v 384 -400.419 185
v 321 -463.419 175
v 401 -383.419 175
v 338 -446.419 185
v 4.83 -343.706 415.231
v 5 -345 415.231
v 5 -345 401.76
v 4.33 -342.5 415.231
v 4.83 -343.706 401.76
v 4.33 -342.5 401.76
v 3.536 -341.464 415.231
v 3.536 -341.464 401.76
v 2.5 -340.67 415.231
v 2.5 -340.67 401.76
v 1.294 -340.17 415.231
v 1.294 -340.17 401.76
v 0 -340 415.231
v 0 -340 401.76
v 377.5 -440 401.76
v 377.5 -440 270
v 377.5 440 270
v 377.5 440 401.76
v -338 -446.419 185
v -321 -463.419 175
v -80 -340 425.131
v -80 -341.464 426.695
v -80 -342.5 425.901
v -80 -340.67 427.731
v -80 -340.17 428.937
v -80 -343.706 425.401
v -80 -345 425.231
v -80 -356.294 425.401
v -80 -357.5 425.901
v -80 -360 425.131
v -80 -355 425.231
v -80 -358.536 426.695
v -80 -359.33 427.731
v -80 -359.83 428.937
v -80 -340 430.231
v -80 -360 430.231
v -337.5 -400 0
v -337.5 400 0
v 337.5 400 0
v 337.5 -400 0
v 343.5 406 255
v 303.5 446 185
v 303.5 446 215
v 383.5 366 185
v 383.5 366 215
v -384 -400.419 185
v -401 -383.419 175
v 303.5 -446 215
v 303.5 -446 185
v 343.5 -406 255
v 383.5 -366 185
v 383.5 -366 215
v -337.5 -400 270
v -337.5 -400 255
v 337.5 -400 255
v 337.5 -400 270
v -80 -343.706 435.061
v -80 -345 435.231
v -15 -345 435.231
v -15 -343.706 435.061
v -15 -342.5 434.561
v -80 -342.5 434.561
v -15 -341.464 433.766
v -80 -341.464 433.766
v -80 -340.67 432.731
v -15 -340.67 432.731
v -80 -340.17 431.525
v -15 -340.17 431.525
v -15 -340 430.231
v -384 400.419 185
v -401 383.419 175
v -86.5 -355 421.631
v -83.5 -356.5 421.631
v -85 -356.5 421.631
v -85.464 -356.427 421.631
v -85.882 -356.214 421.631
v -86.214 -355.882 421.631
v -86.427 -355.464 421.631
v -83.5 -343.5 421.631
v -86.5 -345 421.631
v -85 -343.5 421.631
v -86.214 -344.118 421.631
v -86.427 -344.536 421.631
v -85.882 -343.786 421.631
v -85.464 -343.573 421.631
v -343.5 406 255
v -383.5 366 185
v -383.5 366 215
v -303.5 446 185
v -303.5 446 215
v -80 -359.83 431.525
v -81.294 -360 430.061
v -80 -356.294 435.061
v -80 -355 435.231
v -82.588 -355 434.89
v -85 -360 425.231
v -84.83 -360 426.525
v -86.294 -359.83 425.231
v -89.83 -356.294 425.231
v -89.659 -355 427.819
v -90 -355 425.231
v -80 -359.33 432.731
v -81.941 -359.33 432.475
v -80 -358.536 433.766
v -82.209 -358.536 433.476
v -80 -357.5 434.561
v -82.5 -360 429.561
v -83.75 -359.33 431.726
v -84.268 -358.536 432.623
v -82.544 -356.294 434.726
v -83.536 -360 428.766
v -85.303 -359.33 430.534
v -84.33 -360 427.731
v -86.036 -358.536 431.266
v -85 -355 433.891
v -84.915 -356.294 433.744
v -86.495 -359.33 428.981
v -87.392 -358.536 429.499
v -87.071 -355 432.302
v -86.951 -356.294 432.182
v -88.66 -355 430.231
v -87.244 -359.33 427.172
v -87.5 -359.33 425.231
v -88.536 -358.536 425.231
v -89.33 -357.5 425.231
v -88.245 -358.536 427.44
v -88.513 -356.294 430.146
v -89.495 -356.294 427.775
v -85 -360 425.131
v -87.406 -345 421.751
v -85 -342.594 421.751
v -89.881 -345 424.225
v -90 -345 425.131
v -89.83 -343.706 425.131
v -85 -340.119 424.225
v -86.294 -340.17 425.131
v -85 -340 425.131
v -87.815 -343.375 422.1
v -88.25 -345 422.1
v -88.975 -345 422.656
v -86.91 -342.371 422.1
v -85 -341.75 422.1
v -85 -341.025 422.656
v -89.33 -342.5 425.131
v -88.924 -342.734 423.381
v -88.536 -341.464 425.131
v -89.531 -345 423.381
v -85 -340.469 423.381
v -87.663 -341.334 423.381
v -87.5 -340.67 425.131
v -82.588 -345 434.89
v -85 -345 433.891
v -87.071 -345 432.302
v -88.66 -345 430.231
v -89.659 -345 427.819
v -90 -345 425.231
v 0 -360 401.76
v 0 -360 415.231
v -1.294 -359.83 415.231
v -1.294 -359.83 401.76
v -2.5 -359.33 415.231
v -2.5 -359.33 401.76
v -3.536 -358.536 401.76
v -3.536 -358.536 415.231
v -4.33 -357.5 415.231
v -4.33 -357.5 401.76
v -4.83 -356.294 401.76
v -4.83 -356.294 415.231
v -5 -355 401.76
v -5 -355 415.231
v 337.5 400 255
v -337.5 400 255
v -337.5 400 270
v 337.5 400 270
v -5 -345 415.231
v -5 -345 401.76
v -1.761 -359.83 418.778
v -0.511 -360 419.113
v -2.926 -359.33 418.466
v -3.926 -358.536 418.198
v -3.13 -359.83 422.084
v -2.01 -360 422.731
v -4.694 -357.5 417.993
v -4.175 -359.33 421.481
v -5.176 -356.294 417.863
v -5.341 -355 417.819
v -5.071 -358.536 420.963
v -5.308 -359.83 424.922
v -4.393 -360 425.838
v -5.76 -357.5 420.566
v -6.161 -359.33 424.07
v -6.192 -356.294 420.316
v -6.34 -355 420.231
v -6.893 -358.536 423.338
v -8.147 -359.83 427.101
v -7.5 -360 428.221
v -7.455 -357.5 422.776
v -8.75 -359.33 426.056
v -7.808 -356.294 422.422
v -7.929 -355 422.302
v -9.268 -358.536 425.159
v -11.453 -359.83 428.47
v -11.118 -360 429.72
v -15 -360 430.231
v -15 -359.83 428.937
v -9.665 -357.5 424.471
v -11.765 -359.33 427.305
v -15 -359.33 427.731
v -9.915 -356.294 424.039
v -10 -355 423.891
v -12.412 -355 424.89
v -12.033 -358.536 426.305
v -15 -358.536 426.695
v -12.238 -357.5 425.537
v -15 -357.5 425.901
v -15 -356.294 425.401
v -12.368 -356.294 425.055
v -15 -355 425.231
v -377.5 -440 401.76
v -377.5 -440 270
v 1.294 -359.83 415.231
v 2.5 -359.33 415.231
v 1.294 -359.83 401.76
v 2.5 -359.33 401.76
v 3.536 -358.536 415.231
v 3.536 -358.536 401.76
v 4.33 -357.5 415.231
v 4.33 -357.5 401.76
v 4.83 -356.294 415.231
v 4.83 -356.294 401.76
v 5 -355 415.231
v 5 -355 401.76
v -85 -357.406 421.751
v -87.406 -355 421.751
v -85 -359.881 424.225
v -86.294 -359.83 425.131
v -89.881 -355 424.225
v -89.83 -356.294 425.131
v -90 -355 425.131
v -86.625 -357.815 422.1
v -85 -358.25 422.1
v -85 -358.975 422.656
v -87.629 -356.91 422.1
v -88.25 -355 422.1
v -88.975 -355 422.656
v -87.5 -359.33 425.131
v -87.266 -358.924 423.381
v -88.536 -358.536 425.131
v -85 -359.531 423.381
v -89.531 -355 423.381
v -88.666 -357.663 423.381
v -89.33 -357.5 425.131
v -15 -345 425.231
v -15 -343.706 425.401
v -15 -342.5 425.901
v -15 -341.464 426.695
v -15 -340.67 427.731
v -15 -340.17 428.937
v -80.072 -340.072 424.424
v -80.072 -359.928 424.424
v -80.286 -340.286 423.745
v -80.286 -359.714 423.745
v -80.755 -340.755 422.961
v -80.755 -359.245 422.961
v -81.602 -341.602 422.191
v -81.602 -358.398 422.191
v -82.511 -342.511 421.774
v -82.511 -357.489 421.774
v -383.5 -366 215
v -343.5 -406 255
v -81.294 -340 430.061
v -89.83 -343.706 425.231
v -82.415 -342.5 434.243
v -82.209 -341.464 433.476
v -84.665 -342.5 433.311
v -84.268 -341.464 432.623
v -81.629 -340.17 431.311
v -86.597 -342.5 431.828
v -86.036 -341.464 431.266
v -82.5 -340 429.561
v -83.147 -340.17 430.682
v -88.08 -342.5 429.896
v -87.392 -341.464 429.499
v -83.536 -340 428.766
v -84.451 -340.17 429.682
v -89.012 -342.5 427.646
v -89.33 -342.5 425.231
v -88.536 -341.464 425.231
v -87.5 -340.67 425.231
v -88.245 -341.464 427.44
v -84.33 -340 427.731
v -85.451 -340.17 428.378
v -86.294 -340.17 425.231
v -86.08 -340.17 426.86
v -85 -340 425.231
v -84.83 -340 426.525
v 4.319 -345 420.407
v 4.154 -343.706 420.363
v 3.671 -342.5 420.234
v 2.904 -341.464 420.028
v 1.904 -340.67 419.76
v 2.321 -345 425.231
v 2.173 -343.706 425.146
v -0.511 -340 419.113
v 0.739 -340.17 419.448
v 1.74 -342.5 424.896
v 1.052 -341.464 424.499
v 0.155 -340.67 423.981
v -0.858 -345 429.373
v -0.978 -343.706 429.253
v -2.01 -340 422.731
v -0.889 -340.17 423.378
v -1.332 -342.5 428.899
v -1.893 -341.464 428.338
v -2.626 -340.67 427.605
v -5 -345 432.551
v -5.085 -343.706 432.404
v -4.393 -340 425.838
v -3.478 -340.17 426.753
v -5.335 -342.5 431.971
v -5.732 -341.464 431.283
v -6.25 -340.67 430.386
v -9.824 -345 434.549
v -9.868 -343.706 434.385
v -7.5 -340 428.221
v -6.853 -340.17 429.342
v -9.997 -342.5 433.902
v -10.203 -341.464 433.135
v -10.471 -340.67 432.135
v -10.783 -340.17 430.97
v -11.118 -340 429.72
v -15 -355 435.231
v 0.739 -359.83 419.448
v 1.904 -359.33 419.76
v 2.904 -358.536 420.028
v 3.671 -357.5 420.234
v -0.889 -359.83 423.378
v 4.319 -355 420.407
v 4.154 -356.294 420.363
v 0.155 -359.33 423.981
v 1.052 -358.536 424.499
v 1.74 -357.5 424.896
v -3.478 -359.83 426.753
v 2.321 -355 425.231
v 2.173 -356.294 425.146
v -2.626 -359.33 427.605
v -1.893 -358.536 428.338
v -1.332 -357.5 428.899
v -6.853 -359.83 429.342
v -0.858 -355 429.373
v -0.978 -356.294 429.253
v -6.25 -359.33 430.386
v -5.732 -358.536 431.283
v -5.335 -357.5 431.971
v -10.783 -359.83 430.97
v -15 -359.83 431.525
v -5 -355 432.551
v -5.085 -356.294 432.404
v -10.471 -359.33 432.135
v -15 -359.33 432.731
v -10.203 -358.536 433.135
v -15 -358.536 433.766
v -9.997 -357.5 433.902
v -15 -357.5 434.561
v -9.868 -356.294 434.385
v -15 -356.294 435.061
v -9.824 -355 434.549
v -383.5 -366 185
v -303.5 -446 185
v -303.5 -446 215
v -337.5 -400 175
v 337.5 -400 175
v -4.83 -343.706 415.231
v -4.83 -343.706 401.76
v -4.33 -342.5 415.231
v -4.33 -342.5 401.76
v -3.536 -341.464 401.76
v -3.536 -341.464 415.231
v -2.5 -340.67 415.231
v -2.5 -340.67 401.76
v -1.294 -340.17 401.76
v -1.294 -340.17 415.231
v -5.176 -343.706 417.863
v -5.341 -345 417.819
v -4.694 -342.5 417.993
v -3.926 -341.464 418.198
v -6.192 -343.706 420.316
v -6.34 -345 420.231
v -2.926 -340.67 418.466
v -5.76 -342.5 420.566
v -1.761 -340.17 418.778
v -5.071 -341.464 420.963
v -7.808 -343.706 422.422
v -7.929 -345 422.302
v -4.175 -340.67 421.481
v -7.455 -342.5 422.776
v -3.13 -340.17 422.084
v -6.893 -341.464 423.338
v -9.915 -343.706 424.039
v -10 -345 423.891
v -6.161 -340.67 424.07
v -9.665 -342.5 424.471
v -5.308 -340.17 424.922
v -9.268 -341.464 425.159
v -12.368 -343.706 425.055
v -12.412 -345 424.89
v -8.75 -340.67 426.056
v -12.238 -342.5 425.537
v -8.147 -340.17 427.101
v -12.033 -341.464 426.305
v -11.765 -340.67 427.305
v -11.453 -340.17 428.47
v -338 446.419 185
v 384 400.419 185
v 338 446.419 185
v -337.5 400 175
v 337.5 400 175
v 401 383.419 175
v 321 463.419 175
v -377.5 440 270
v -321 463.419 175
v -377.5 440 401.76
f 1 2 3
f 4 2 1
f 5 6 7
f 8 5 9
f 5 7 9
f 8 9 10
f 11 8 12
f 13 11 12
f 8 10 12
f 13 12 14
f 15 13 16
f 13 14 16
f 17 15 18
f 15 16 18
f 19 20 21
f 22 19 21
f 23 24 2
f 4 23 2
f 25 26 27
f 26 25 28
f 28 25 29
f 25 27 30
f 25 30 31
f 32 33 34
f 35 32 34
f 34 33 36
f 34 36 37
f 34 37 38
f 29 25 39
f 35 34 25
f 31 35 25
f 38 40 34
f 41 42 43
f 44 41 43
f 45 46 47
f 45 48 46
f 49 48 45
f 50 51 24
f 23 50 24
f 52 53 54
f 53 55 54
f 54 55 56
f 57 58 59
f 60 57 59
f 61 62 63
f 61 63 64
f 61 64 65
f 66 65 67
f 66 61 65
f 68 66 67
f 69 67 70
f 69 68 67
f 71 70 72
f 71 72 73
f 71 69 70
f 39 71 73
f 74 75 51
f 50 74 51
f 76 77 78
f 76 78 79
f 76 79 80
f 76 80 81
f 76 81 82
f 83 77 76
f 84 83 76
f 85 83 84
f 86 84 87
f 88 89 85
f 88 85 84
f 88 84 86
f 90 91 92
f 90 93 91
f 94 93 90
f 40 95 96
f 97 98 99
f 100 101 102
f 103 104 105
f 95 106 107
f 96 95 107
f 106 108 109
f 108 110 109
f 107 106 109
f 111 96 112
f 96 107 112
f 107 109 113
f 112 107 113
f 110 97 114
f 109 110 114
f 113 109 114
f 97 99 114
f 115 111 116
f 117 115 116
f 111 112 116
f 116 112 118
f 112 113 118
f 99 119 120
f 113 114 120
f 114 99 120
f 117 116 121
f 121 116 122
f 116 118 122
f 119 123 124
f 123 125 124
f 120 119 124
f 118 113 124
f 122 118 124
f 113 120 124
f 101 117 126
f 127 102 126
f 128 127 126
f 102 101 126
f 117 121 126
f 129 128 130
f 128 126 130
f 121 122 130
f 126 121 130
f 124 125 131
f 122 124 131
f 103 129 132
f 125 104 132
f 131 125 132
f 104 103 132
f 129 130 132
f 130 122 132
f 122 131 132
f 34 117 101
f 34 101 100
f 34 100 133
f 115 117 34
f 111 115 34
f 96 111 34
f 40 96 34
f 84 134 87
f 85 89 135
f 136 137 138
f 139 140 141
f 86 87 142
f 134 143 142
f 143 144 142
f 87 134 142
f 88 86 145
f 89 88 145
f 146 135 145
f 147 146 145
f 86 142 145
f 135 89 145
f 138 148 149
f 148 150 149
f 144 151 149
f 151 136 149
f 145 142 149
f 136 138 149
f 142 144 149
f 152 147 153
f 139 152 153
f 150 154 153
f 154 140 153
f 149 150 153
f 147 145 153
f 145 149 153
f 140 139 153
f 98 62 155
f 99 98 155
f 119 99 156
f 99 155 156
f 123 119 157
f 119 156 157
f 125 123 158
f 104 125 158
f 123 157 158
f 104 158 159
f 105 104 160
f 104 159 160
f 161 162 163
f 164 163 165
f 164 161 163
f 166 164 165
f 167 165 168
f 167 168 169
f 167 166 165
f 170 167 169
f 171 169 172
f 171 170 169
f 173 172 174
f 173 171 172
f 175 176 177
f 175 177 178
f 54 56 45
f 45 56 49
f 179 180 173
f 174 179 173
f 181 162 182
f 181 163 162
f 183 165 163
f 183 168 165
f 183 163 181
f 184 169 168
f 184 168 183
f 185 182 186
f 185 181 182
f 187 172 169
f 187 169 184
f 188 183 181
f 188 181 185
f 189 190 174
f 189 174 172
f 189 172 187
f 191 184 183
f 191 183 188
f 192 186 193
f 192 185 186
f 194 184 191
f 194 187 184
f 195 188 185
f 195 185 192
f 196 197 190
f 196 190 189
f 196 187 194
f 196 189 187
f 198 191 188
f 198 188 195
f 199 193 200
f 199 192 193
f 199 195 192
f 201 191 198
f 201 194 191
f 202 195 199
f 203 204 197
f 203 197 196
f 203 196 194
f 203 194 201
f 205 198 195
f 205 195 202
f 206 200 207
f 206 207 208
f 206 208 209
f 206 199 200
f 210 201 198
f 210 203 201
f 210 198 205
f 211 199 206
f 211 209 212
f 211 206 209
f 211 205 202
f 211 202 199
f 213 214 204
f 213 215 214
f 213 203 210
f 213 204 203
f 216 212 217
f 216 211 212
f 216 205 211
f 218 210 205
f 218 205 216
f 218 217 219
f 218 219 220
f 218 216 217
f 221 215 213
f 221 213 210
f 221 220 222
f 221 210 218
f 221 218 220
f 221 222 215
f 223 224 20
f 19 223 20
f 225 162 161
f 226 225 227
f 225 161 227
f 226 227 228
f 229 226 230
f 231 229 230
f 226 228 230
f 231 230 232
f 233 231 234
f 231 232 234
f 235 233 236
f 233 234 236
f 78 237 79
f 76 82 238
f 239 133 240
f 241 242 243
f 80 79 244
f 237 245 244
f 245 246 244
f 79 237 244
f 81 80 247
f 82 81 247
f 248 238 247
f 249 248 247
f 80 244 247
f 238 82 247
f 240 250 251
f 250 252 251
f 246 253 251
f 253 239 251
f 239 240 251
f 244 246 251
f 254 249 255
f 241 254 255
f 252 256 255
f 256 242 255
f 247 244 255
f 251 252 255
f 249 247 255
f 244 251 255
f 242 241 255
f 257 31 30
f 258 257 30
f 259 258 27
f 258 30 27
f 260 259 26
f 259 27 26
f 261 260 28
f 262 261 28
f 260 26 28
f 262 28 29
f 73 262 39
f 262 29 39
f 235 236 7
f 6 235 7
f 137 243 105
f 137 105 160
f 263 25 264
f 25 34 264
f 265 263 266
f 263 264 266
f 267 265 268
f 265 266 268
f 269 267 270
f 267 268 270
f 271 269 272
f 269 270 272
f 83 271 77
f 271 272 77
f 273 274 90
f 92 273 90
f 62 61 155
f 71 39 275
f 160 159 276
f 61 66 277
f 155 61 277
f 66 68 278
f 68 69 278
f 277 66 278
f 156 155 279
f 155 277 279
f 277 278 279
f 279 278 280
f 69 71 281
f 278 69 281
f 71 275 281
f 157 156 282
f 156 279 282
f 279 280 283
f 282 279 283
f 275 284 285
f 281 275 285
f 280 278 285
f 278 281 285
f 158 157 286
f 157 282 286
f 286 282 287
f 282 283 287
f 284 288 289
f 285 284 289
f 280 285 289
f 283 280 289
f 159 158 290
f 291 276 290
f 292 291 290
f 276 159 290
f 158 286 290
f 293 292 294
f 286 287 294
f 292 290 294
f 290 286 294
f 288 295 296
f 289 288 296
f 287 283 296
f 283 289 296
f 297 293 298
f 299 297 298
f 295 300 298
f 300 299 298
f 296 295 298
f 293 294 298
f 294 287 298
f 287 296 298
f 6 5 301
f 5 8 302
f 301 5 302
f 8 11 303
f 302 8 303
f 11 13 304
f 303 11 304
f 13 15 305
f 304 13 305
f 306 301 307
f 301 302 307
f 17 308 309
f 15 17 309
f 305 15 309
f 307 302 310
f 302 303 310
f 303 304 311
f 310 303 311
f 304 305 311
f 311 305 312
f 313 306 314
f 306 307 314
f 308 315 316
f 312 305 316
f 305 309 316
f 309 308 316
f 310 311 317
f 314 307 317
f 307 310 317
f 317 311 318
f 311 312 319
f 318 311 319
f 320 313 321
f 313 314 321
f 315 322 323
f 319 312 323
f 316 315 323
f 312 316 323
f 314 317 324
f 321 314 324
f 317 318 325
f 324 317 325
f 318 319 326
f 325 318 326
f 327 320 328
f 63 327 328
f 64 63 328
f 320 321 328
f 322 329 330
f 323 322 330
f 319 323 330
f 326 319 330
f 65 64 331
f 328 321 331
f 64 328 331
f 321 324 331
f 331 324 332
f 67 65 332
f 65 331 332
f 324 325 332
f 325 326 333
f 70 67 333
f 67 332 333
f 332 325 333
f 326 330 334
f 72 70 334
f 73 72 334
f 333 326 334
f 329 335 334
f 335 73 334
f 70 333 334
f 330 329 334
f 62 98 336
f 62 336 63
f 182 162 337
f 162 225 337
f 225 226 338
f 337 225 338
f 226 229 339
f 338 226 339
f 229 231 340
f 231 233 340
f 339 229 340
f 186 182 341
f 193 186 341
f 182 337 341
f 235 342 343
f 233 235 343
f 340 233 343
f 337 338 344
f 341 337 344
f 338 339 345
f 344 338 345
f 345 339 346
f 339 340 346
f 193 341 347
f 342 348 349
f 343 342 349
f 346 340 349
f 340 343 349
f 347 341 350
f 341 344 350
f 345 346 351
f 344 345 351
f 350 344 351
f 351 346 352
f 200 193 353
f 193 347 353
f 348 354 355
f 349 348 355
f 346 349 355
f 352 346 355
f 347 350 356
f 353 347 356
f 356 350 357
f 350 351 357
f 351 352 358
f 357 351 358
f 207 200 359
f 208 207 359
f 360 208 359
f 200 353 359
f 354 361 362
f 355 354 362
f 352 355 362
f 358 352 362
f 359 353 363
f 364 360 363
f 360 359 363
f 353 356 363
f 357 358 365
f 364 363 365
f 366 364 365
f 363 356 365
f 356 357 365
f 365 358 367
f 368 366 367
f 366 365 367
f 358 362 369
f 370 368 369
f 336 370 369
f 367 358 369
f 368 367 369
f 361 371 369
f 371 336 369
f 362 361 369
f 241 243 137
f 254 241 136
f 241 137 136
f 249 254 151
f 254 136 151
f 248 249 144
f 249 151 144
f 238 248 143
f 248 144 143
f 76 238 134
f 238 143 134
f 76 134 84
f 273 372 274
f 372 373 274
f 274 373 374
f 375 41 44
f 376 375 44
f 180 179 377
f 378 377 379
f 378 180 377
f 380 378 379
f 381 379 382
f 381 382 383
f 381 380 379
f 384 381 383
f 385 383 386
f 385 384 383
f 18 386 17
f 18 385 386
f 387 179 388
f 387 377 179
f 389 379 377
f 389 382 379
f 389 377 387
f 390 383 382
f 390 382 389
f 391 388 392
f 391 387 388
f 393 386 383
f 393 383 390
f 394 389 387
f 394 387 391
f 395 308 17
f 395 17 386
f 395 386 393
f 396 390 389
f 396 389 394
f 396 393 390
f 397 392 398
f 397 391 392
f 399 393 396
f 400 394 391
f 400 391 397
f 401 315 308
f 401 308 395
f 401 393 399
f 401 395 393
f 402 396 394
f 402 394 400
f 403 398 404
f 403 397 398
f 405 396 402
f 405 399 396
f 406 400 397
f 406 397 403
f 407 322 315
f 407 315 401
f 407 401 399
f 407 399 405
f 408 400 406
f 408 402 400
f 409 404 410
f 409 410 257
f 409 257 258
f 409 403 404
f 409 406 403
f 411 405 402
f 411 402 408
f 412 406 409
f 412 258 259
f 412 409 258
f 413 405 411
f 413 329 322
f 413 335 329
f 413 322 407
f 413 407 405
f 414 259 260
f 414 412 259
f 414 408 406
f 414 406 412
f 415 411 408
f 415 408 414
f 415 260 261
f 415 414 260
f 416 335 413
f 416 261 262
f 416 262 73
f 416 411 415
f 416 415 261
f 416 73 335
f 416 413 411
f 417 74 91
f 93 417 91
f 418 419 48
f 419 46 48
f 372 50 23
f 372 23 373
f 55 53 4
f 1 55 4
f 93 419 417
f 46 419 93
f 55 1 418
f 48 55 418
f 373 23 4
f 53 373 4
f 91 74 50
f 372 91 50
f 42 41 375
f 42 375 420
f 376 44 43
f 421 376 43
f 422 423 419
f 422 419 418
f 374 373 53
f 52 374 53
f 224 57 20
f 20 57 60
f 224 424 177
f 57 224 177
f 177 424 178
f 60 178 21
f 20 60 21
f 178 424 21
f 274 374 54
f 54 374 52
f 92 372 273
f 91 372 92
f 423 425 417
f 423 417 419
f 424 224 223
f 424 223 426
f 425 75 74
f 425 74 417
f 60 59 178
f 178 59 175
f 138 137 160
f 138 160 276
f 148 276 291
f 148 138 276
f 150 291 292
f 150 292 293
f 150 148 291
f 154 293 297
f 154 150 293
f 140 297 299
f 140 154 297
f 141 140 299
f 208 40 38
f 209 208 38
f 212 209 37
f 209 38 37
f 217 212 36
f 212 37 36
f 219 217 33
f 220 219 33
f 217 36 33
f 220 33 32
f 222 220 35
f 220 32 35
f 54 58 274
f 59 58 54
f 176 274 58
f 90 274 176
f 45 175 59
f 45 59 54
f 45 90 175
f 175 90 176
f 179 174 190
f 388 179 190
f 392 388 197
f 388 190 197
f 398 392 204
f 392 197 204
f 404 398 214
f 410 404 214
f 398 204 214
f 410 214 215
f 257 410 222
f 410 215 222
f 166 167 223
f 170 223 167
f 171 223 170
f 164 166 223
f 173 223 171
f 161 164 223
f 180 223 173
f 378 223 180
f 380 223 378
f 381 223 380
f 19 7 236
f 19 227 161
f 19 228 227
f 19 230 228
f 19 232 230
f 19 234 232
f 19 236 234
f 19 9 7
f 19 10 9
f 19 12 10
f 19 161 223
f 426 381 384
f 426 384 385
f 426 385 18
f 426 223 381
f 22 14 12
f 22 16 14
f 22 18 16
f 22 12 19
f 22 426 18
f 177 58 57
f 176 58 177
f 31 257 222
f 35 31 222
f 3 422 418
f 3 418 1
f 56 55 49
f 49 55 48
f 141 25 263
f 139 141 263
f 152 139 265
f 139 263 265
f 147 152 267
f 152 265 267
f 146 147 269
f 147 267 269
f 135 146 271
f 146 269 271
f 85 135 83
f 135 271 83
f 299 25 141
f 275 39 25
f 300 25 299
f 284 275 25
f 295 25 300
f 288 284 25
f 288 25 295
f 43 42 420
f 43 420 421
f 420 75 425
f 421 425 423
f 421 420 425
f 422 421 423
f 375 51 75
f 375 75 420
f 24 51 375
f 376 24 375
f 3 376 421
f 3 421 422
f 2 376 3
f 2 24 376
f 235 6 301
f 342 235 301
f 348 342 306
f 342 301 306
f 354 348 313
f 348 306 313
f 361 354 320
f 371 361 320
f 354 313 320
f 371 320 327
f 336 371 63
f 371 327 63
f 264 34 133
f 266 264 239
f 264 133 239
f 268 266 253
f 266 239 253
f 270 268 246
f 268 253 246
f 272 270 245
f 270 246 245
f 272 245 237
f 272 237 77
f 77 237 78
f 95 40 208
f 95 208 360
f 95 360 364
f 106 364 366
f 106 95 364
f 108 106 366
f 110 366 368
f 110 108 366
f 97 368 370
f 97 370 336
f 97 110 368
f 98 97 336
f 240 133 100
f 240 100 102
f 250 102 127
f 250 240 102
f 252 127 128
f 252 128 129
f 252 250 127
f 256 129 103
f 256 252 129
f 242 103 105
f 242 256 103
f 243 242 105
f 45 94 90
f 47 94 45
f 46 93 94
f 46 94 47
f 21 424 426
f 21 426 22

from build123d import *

# Parameters (mm, degrees)
F0_W          = 675
F0_H          = 800
F1_DEPTH      = 270
F2_W          = 755
F2_H          = 880
F3_DEPTH      = 131.76
F5_START      = -175
F4_W          = 802
F4_H          = 926.8378600104
F5_DEPTH      = 10
F6_W          = 767
F6_H          = 892
F7_DEPTH      = 70
F8_SIZE       = 80
F9_SIZE       = 39.99999
F10_SIZE2     = 9.99999
F10_SIZE      = 16.99999
F13_W         = 10
F13_H         = 20
F15_R         = 3.5
F16_T1_DEPTH  = 65
F16_T3_DEPTH  = 3.5995793343
F16_T5_DEPTH  = 13.4709453487
F16_T8_ANGLE  = 90
F16_T10_ANGLE = 90
F16_T12_ANGLE = 90
F16_T14_ANGLE = 90
F16_T16_ANGLE = 90
F16_T18_ANGLE = 90
F16_T20_ANGLE = 90
F16_T22_ANGLE = 90


# Not quite as in the source:
# - a fillet or chamfer that OpenCascade refuses, or shapes differently, is made with other operations: its cross-section is extruded or revolved along the edge and cut away or added
# - a fillet or chamfer is up to 0.001 mm smaller than in the source, because OpenCascade refuses the exact size
# - a feature names something its author has since deleted; it is built from what else it names


with BuildPart() as f1:
    # F0 (on Top) → F1 (new body)
    with BuildSketch(Plane.XY):
        Rectangle(F0_W, F0_H)
    extrude(amount=F1_DEPTH)

    # F2 (on face) → F3 (join)
    with BuildSketch(Plane.XY.offset(270)):
        Rectangle(F2_W, F2_H)
    extrude(amount=F3_DEPTH)

    # F4 (on face) → F5 (join)
    with BuildSketch(Plane(origin=(0, 0, 0), x_dir=(1, 0, 0), z_dir=(0, 0, -1)).offset(F5_START)):
        Rectangle(F4_W, F4_H)
    extrude(amount=-F5_DEPTH)

    # F6 (on face) → F7 (join)
    with BuildSketch(Plane.XY.offset(185)):
        Rectangle(F6_W, F6_H)
    extrude(amount=F7_DEPTH)

    # F8
    f8_edges = [f1.edges().sort_by_distance(p)[0] for p in [
        (383.5, 446, 220),
        (-383.5, 446, 220),
        (-383.5, -446, 220),
        (-401, 463.41893, 180),
        (-401, -463.41893, 180),
        (401, 463.41893, 180),
        (401, -463.41893, 180),
        (383.5, -446, 220),
    ]]
    chamfer(f8_edges, length=F8_SIZE)

    # F9 (size 40 in the source; OpenCascade refuses exactly that, so slightly less here)
    f9_edges = [f1.edges().sort_by_distance(p)[0] for p in [
        (383.5, 0, 255),
        (-383.5, 0, 255),
        (0, 446, 255),
        (0, -446, 255),
    ]]
    chamfer(f9_edges, length=F9_SIZE)

    # F10 (size 17 and 10 in the source; OpenCascade refuses exactly that, so slightly less here)
    f10_edges = [f1.edges().sort_by_distance(p)[0] for p in [
        (-401, 0, 185),
        (0, 463.41893, 185),
        (0, -463.41893, 185),
        (401, 0, 185),
    ]]
    chamfer(f10_edges, length=F10_SIZE, length2=F10_SIZE2)

    # F14: sweep along a path in F12
    with BuildLine(Plane.XZ.offset(350)) as f14_path:
        Line((0, 401.76), (0, 415.2309453487))
        ThreePointArc((0, 415.2309453487), (-4.3933982822, 425.8375470665), (-15, 430.2309453487))
        Line((-15, 430.2309453487), (-80, 430.2309453487))
        ThreePointArc((-80, 430.2309453487), (-83.5355339059, 428.7664792547), (-85, 425.2309453487))
        Line((-85, 425.2309453487), (-85, 421.6313660145))
    # F13 (on face) → F14 (sweep)
    with BuildSketch(Plane.XY.offset(401.76)):
        with Locations((0, -350)):
            Rectangle(F13_W, F13_H)
    sweep(path=f14_path.line)

    # F15
    f15_edges = [f1.edges().sort_by_distance(p)[0] for p in [
        (-90, -350, 421.631366),
        (-85, -360, 421.631366),
        (-80, -350, 421.631366),
        (-85, -340, 421.631366),
    ]]
    fillet(f15_edges, radius=F15_R)

    # F16: fillet of radius 5 on 16 edges, made by hand

    # F16_s2 → F16_t1 (cut)
    with BuildSketch(Plane.YZ.offset(-80)):
        with BuildLine():
            ThreePointArc((-360, 430.2309453487), (-358.5355339059, 433.7664792547), (-355, 435.2309453487))
            Line((-355, 435.2309453487), (-360, 435.2309453487))
            Line((-360, 435.2309453487), (-360, 430.2309453487))
        make_face()
        with BuildLine():
            ThreePointArc((-345, 435.2309453487), (-341.4644660941, 433.7664792547), (-340, 430.2309453487))
            Line((-340, 430.2309453487), (-340, 435.2309453487))
            Line((-340, 435.2309453487), (-345, 435.2309453487))
        make_face()
        with BuildLine():
            ThreePointArc((-360, 430.2309453487), (-358.5355339059, 426.6954114428), (-355, 425.2309453487))
            Line((-355, 425.2309453487), (-360, 425.2309453487))
            Line((-360, 425.2309453487), (-360, 430.2309453487))
        make_face()
        with BuildLine():
            ThreePointArc((-345, 425.2309453487), (-341.4644660941, 426.6954114428), (-340, 430.2309453487))
            Line((-340, 430.2309453487), (-340, 425.2309453487))
            Line((-340, 425.2309453487), (-345, 425.2309453487))
        make_face()
    extrude(amount=F16_T1_DEPTH, mode=Mode.SUBTRACT)

    # F16_s4 → F16_t3 (cut)
    with BuildSketch(Plane.XY.offset(421.6313660145)):
        with BuildLine():
            ThreePointArc((-85, -360), (-88.5355339059, -358.5355339059), (-90, -355))
            Line((-90, -355), (-90, -360))
            Line((-90, -360), (-85, -360))
        make_face()
        with BuildLine():
            ThreePointArc((-90, -345), (-88.5355339059, -341.4644660941), (-85, -340))
            Line((-85, -340), (-90, -340))
            Line((-90, -340), (-90, -345))
        make_face()
    extrude(amount=F16_T3_DEPTH, mode=Mode.SUBTRACT)

    # F16_s6 → F16_t5 (cut)
    with BuildSketch(Plane.XY.offset(401.76)):
        with BuildLine():
            ThreePointArc((0, -360), (3.5355339059, -358.5355339059), (5, -355))
            Line((5, -355), (5, -360))
            Line((5, -360), (0, -360))
        make_face()
        with BuildLine():
            ThreePointArc((0, -360), (-3.5355339059, -358.5355339059), (-5, -355))
            Line((-5, -355), (-5, -360))
            Line((-5, -360), (0, -360))
        make_face()
        with BuildLine():
            ThreePointArc((5, -345), (3.5355339059, -341.4644660941), (0, -340))
            Line((0, -340), (5, -340))
            Line((5, -340), (5, -345))
        make_face()
        with BuildLine():
            ThreePointArc((-5, -345), (-3.5355339059, -341.4644660941), (0, -340))
            Line((0, -340), (-5, -340))
            Line((-5, -340), (-5, -345))
        make_face()
    extrude(amount=F16_T5_DEPTH, mode=Mode.SUBTRACT)

    # F16_s7 → F16_t8 (revolve, cut)
    with BuildSketch(Plane.XZ.offset(345)):
        with BuildLine():
            ThreePointArc((-86.5, 421.6313660145), (-88.9748737342, 422.6564922803), (-90, 425.1313660145))
            Line((-90, 425.1313660145), (-90, 421.6313660145))
            Line((-90, 421.6313660145), (-86.5, 421.6313660145))
        make_face()
    revolve(axis=Axis((-85, -345, 421.6313660145), (0, 0, -1)), revolution_arc=F16_T8_ANGLE, mode=Mode.SUBTRACT)

    # F16_s9 → F16_t10 (revolve, cut)
    with BuildSketch(Plane.YZ.offset(-85)):
        with BuildLine():
            ThreePointArc((-356.5, 421.6313660145), (-358.9748737342, 422.6564922803), (-360, 425.1313660145))
            Line((-360, 425.1313660145), (-360, 421.6313660145))
            Line((-360, 421.6313660145), (-356.5, 421.6313660145))
        make_face()
    revolve(axis=Axis((-85, -355, 421.6313660145), (0, 0, -1)), revolution_arc=F16_T10_ANGLE, mode=Mode.SUBTRACT)

    # F16_s11 → F16_t12 (revolve, cut)
    with BuildSketch(Plane.YZ.offset(-80)):
        with BuildLine():
            ThreePointArc((-360, 430.2309453487), (-358.5355339059, 433.7664792547), (-355, 435.2309453487))
            Line((-355, 435.2309453487), (-360, 435.2309453487))
            Line((-360, 435.2309453487), (-360, 430.2309453487))
        make_face()
    revolve(axis=Axis((-80, -360, 425.2309453487), (0, -1, 0)), revolution_arc=F16_T12_ANGLE, mode=Mode.SUBTRACT)

    # F16_s13 → F16_t14 (revolve, cut)
    with BuildSketch(Plane.XY.offset(415.2309453487)):
        with BuildLine():
            ThreePointArc((0, -360), (3.5355339059, -358.5355339059), (5, -355))
            Line((5, -355), (5, -360))
            Line((5, -360), (0, -360))
        make_face()
    revolve(axis=Axis((-15, -360, 415.2309453487), (0, -1, 0)), revolution_arc=F16_T14_ANGLE, mode=Mode.SUBTRACT)

    # F16_s15 → F16_t16 (revolve, cut)
    with BuildSketch(Plane.XY.offset(415.2309453487)):
        with BuildLine():
            ThreePointArc((0, -360), (-3.5355339059, -358.5355339059), (-5, -355))
            Line((-5, -355), (-5, -360))
            Line((-5, -360), (0, -360))
        make_face()
    revolve(axis=Axis((-15, -360, 415.2309453487), (0, -1, 0)), revolution_arc=F16_T16_ANGLE, mode=Mode.SUBTRACT)

    # F16_s17 → F16_t18 (revolve, cut)
    with BuildSketch(Plane.YZ.offset(-80)):
        with BuildLine():
            ThreePointArc((-345, 435.2309453487), (-341.4644660941, 433.7664792547), (-340, 430.2309453487))
            Line((-340, 430.2309453487), (-340, 435.2309453487))
            Line((-340, 435.2309453487), (-345, 435.2309453487))
        make_face()
    revolve(axis=Axis((-80, -340, 425.2309453487), (0, -1, 0)), revolution_arc=F16_T18_ANGLE, mode=Mode.SUBTRACT)

    # F16_s19 → F16_t20 (revolve, cut)
    with BuildSketch(Plane.XY.offset(415.2309453487)):
        with BuildLine():
            ThreePointArc((5, -345), (3.5355339059, -341.4644660941), (0, -340))
            Line((0, -340), (5, -340))
            Line((5, -340), (5, -345))
        make_face()
    revolve(axis=Axis((-15, -340, 415.2309453487), (0, -1, 0)), revolution_arc=F16_T20_ANGLE, mode=Mode.SUBTRACT)

    # F16_s21 → F16_t22 (revolve, cut)
    with BuildSketch(Plane.XY.offset(415.2309453487)):
        with BuildLine():
            ThreePointArc((-5, -345), (-3.5355339059, -341.4644660941), (0, -340))
            Line((0, -340), (-5, -340))
            Line((-5, -340), (-5, -345))
        make_face()
    revolve(axis=Axis((-15, -340, 415.2309453487), (0, -1, 0)), revolution_arc=F16_T22_ANGLE, mode=Mode.SUBTRACT)


solid = f1.part
